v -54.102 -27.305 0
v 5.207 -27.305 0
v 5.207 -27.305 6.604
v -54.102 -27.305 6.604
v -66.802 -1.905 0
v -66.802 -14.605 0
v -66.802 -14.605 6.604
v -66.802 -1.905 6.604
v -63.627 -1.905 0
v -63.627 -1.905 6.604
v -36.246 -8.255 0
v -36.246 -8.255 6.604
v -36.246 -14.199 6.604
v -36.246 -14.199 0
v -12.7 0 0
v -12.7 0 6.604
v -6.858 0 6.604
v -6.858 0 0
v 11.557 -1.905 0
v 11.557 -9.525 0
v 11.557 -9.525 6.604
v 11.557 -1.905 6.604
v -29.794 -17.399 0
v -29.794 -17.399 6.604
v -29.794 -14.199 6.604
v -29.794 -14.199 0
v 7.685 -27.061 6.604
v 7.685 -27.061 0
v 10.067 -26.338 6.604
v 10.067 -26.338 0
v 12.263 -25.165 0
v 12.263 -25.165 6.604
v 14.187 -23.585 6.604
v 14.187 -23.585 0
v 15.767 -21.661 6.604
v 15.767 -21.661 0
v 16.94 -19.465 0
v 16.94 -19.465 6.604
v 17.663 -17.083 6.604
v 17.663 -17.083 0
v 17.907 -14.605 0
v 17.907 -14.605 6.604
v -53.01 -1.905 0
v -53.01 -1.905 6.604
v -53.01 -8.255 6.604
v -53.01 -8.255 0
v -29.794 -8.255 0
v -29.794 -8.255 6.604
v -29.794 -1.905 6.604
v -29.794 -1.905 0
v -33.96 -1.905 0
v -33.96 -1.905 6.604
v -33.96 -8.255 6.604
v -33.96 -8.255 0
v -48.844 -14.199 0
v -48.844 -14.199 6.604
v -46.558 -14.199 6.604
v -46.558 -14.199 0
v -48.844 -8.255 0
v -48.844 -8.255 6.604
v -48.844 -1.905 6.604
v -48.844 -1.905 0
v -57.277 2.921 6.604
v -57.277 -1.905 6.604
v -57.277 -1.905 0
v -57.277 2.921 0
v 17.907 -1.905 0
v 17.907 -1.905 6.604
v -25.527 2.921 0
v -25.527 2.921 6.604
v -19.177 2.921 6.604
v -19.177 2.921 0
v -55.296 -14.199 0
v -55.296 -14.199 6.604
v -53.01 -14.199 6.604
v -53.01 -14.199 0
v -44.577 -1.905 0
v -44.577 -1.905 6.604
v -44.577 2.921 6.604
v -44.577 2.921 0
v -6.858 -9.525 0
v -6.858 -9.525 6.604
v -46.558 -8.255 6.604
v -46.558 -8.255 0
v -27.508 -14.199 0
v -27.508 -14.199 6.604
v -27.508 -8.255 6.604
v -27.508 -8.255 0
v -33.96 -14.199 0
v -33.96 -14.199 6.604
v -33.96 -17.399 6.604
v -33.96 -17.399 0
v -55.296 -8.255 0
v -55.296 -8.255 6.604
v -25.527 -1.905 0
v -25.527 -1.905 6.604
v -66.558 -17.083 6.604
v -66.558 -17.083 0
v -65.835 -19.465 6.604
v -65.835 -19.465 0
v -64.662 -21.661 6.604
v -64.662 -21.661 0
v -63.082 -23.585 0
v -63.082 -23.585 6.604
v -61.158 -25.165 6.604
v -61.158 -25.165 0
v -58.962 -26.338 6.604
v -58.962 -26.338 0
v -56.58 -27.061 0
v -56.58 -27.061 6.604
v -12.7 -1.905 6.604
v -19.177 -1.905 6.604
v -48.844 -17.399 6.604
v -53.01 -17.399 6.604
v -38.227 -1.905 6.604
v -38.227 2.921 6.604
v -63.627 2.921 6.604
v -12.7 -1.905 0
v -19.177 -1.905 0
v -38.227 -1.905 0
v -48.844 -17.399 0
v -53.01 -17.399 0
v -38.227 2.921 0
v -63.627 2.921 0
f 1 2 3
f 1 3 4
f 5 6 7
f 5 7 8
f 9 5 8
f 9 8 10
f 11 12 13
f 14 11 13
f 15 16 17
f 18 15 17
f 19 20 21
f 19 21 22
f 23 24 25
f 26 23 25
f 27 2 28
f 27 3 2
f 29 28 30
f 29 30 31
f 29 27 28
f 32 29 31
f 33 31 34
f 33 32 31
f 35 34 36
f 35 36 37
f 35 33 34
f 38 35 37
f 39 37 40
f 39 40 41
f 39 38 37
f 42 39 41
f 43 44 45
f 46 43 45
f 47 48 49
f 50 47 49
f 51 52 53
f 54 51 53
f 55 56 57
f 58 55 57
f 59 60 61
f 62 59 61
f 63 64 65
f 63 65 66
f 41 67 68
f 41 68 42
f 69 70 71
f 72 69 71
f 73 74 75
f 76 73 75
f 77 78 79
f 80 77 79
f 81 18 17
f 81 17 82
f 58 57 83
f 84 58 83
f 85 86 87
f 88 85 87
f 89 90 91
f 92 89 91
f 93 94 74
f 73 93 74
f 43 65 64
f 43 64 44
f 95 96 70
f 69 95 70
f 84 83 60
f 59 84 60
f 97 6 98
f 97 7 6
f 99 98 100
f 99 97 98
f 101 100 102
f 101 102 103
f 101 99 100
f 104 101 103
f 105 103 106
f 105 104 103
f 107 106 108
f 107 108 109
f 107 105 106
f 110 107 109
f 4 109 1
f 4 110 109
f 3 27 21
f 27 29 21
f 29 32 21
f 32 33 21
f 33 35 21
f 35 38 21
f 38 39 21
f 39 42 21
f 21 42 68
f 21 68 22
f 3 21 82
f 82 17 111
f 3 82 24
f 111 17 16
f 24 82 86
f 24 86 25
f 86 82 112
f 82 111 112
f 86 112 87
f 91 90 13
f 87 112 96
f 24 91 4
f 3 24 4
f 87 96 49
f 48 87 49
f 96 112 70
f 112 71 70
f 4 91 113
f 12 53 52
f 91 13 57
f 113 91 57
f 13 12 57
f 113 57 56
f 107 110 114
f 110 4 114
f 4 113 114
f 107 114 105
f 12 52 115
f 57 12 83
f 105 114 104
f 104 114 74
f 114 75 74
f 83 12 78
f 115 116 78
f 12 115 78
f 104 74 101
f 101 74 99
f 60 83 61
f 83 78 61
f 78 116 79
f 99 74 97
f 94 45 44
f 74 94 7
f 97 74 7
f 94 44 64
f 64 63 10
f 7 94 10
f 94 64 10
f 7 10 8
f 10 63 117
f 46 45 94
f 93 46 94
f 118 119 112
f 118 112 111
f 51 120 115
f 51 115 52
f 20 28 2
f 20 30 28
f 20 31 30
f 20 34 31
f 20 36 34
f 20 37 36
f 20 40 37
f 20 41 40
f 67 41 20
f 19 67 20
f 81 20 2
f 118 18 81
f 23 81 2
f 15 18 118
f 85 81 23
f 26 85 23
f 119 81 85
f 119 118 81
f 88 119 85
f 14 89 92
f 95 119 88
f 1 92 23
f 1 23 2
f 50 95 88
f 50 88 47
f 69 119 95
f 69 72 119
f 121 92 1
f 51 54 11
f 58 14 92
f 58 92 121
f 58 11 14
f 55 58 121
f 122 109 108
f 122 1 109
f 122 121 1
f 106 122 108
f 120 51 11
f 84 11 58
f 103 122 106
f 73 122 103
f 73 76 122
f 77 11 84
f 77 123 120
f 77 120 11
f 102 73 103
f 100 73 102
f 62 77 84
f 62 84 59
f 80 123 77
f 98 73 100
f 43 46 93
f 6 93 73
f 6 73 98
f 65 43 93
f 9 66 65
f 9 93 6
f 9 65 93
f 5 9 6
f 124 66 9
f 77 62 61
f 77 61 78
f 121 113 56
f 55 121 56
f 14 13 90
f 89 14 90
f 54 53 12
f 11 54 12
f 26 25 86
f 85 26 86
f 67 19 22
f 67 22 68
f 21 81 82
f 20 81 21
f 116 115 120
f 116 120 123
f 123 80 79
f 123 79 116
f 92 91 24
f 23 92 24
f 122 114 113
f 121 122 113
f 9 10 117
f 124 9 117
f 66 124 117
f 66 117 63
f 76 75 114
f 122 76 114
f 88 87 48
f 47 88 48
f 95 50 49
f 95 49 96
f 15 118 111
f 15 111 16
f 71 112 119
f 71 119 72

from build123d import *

# Parameters (mm, degrees)
BOSS_EXTRUDE1_DEPTH = 6.604
CUT_EXTRUDE1_DEPTH  = 7.604
SKETCH3_W           = 6.35
SKETCH3_H           = 4.826
BOSS_EXTRUDE2_DEPTH = 6.604
FILLET1_R           = 12.7


with BuildPart() as part:
    # Sketch1 → Boss-Extrude1 (new body)
    with BuildSketch(Plane.XY):
        Polygon((-6.858, 0), (-6.858, -9.525), (11.557, -9.525), (11.557, -1.905), (17.907, -1.905), (17.907, -27.305), (-66.802, -27.305), (-66.802, -1.905), (-12.7, -1.905), (-12.7, 0), align=None)
    extrude(amount=BOSS_EXTRUDE1_DEPTH)

    # Sketch2 → Cut-Extrude1 (cut, through all)
    with BuildSketch(Plane.XY.offset(6.604)):
        Polygon((-53.0098, -1.905), (-53.0098, -8.255), (-55.2958, -8.255), (-55.2958, -14.1986), (-53.0098, -14.1986), (-53.0098, -17.399), (-48.8442, -17.399), (-48.8442, -14.1986), (-46.5582, -14.1986), (-46.5582, -8.255), (-48.8442, -8.255), (-48.8442, -1.905), align=None)
        Polygon((-33.9598, -1.905), (-33.9598, -8.255), (-36.2458, -8.255), (-36.2458, -14.1986), (-33.9598, -14.1986), (-33.9598, -17.399), (-29.7942, -17.399), (-29.7942, -14.1986), (-27.5082, -14.1986), (-27.5082, -8.255), (-29.7942, -8.255), (-29.7942, -1.905), align=None)
    extrude(amount=-CUT_EXTRUDE1_DEPTH, mode=Mode.SUBTRACT)

    # Sketch3 → Boss-Extrude2 (add)
    with BuildSketch(Plane.XY.offset(6.604)):
        with Locations((-60.452, 0.508)):
            Rectangle(SKETCH3_W, SKETCH3_H)
        with Locations((-41.402, 0.508)):
            Rectangle(SKETCH3_W, SKETCH3_H)
        with Locations((-22.352, 0.508)):
            Rectangle(SKETCH3_W, SKETCH3_H)
    extrude(amount=-BOSS_EXTRUDE2_DEPTH)

    # Fillet1
    fillet1_edges = [part.edges().sort_by_distance(p)[0] for p in [
        (17.907, -27.305, 3.302),
        (-66.802, -27.305, 3.302),
    ]]
    fillet(fillet1_edges, radius=FILLET1_R)


solid = part.part
